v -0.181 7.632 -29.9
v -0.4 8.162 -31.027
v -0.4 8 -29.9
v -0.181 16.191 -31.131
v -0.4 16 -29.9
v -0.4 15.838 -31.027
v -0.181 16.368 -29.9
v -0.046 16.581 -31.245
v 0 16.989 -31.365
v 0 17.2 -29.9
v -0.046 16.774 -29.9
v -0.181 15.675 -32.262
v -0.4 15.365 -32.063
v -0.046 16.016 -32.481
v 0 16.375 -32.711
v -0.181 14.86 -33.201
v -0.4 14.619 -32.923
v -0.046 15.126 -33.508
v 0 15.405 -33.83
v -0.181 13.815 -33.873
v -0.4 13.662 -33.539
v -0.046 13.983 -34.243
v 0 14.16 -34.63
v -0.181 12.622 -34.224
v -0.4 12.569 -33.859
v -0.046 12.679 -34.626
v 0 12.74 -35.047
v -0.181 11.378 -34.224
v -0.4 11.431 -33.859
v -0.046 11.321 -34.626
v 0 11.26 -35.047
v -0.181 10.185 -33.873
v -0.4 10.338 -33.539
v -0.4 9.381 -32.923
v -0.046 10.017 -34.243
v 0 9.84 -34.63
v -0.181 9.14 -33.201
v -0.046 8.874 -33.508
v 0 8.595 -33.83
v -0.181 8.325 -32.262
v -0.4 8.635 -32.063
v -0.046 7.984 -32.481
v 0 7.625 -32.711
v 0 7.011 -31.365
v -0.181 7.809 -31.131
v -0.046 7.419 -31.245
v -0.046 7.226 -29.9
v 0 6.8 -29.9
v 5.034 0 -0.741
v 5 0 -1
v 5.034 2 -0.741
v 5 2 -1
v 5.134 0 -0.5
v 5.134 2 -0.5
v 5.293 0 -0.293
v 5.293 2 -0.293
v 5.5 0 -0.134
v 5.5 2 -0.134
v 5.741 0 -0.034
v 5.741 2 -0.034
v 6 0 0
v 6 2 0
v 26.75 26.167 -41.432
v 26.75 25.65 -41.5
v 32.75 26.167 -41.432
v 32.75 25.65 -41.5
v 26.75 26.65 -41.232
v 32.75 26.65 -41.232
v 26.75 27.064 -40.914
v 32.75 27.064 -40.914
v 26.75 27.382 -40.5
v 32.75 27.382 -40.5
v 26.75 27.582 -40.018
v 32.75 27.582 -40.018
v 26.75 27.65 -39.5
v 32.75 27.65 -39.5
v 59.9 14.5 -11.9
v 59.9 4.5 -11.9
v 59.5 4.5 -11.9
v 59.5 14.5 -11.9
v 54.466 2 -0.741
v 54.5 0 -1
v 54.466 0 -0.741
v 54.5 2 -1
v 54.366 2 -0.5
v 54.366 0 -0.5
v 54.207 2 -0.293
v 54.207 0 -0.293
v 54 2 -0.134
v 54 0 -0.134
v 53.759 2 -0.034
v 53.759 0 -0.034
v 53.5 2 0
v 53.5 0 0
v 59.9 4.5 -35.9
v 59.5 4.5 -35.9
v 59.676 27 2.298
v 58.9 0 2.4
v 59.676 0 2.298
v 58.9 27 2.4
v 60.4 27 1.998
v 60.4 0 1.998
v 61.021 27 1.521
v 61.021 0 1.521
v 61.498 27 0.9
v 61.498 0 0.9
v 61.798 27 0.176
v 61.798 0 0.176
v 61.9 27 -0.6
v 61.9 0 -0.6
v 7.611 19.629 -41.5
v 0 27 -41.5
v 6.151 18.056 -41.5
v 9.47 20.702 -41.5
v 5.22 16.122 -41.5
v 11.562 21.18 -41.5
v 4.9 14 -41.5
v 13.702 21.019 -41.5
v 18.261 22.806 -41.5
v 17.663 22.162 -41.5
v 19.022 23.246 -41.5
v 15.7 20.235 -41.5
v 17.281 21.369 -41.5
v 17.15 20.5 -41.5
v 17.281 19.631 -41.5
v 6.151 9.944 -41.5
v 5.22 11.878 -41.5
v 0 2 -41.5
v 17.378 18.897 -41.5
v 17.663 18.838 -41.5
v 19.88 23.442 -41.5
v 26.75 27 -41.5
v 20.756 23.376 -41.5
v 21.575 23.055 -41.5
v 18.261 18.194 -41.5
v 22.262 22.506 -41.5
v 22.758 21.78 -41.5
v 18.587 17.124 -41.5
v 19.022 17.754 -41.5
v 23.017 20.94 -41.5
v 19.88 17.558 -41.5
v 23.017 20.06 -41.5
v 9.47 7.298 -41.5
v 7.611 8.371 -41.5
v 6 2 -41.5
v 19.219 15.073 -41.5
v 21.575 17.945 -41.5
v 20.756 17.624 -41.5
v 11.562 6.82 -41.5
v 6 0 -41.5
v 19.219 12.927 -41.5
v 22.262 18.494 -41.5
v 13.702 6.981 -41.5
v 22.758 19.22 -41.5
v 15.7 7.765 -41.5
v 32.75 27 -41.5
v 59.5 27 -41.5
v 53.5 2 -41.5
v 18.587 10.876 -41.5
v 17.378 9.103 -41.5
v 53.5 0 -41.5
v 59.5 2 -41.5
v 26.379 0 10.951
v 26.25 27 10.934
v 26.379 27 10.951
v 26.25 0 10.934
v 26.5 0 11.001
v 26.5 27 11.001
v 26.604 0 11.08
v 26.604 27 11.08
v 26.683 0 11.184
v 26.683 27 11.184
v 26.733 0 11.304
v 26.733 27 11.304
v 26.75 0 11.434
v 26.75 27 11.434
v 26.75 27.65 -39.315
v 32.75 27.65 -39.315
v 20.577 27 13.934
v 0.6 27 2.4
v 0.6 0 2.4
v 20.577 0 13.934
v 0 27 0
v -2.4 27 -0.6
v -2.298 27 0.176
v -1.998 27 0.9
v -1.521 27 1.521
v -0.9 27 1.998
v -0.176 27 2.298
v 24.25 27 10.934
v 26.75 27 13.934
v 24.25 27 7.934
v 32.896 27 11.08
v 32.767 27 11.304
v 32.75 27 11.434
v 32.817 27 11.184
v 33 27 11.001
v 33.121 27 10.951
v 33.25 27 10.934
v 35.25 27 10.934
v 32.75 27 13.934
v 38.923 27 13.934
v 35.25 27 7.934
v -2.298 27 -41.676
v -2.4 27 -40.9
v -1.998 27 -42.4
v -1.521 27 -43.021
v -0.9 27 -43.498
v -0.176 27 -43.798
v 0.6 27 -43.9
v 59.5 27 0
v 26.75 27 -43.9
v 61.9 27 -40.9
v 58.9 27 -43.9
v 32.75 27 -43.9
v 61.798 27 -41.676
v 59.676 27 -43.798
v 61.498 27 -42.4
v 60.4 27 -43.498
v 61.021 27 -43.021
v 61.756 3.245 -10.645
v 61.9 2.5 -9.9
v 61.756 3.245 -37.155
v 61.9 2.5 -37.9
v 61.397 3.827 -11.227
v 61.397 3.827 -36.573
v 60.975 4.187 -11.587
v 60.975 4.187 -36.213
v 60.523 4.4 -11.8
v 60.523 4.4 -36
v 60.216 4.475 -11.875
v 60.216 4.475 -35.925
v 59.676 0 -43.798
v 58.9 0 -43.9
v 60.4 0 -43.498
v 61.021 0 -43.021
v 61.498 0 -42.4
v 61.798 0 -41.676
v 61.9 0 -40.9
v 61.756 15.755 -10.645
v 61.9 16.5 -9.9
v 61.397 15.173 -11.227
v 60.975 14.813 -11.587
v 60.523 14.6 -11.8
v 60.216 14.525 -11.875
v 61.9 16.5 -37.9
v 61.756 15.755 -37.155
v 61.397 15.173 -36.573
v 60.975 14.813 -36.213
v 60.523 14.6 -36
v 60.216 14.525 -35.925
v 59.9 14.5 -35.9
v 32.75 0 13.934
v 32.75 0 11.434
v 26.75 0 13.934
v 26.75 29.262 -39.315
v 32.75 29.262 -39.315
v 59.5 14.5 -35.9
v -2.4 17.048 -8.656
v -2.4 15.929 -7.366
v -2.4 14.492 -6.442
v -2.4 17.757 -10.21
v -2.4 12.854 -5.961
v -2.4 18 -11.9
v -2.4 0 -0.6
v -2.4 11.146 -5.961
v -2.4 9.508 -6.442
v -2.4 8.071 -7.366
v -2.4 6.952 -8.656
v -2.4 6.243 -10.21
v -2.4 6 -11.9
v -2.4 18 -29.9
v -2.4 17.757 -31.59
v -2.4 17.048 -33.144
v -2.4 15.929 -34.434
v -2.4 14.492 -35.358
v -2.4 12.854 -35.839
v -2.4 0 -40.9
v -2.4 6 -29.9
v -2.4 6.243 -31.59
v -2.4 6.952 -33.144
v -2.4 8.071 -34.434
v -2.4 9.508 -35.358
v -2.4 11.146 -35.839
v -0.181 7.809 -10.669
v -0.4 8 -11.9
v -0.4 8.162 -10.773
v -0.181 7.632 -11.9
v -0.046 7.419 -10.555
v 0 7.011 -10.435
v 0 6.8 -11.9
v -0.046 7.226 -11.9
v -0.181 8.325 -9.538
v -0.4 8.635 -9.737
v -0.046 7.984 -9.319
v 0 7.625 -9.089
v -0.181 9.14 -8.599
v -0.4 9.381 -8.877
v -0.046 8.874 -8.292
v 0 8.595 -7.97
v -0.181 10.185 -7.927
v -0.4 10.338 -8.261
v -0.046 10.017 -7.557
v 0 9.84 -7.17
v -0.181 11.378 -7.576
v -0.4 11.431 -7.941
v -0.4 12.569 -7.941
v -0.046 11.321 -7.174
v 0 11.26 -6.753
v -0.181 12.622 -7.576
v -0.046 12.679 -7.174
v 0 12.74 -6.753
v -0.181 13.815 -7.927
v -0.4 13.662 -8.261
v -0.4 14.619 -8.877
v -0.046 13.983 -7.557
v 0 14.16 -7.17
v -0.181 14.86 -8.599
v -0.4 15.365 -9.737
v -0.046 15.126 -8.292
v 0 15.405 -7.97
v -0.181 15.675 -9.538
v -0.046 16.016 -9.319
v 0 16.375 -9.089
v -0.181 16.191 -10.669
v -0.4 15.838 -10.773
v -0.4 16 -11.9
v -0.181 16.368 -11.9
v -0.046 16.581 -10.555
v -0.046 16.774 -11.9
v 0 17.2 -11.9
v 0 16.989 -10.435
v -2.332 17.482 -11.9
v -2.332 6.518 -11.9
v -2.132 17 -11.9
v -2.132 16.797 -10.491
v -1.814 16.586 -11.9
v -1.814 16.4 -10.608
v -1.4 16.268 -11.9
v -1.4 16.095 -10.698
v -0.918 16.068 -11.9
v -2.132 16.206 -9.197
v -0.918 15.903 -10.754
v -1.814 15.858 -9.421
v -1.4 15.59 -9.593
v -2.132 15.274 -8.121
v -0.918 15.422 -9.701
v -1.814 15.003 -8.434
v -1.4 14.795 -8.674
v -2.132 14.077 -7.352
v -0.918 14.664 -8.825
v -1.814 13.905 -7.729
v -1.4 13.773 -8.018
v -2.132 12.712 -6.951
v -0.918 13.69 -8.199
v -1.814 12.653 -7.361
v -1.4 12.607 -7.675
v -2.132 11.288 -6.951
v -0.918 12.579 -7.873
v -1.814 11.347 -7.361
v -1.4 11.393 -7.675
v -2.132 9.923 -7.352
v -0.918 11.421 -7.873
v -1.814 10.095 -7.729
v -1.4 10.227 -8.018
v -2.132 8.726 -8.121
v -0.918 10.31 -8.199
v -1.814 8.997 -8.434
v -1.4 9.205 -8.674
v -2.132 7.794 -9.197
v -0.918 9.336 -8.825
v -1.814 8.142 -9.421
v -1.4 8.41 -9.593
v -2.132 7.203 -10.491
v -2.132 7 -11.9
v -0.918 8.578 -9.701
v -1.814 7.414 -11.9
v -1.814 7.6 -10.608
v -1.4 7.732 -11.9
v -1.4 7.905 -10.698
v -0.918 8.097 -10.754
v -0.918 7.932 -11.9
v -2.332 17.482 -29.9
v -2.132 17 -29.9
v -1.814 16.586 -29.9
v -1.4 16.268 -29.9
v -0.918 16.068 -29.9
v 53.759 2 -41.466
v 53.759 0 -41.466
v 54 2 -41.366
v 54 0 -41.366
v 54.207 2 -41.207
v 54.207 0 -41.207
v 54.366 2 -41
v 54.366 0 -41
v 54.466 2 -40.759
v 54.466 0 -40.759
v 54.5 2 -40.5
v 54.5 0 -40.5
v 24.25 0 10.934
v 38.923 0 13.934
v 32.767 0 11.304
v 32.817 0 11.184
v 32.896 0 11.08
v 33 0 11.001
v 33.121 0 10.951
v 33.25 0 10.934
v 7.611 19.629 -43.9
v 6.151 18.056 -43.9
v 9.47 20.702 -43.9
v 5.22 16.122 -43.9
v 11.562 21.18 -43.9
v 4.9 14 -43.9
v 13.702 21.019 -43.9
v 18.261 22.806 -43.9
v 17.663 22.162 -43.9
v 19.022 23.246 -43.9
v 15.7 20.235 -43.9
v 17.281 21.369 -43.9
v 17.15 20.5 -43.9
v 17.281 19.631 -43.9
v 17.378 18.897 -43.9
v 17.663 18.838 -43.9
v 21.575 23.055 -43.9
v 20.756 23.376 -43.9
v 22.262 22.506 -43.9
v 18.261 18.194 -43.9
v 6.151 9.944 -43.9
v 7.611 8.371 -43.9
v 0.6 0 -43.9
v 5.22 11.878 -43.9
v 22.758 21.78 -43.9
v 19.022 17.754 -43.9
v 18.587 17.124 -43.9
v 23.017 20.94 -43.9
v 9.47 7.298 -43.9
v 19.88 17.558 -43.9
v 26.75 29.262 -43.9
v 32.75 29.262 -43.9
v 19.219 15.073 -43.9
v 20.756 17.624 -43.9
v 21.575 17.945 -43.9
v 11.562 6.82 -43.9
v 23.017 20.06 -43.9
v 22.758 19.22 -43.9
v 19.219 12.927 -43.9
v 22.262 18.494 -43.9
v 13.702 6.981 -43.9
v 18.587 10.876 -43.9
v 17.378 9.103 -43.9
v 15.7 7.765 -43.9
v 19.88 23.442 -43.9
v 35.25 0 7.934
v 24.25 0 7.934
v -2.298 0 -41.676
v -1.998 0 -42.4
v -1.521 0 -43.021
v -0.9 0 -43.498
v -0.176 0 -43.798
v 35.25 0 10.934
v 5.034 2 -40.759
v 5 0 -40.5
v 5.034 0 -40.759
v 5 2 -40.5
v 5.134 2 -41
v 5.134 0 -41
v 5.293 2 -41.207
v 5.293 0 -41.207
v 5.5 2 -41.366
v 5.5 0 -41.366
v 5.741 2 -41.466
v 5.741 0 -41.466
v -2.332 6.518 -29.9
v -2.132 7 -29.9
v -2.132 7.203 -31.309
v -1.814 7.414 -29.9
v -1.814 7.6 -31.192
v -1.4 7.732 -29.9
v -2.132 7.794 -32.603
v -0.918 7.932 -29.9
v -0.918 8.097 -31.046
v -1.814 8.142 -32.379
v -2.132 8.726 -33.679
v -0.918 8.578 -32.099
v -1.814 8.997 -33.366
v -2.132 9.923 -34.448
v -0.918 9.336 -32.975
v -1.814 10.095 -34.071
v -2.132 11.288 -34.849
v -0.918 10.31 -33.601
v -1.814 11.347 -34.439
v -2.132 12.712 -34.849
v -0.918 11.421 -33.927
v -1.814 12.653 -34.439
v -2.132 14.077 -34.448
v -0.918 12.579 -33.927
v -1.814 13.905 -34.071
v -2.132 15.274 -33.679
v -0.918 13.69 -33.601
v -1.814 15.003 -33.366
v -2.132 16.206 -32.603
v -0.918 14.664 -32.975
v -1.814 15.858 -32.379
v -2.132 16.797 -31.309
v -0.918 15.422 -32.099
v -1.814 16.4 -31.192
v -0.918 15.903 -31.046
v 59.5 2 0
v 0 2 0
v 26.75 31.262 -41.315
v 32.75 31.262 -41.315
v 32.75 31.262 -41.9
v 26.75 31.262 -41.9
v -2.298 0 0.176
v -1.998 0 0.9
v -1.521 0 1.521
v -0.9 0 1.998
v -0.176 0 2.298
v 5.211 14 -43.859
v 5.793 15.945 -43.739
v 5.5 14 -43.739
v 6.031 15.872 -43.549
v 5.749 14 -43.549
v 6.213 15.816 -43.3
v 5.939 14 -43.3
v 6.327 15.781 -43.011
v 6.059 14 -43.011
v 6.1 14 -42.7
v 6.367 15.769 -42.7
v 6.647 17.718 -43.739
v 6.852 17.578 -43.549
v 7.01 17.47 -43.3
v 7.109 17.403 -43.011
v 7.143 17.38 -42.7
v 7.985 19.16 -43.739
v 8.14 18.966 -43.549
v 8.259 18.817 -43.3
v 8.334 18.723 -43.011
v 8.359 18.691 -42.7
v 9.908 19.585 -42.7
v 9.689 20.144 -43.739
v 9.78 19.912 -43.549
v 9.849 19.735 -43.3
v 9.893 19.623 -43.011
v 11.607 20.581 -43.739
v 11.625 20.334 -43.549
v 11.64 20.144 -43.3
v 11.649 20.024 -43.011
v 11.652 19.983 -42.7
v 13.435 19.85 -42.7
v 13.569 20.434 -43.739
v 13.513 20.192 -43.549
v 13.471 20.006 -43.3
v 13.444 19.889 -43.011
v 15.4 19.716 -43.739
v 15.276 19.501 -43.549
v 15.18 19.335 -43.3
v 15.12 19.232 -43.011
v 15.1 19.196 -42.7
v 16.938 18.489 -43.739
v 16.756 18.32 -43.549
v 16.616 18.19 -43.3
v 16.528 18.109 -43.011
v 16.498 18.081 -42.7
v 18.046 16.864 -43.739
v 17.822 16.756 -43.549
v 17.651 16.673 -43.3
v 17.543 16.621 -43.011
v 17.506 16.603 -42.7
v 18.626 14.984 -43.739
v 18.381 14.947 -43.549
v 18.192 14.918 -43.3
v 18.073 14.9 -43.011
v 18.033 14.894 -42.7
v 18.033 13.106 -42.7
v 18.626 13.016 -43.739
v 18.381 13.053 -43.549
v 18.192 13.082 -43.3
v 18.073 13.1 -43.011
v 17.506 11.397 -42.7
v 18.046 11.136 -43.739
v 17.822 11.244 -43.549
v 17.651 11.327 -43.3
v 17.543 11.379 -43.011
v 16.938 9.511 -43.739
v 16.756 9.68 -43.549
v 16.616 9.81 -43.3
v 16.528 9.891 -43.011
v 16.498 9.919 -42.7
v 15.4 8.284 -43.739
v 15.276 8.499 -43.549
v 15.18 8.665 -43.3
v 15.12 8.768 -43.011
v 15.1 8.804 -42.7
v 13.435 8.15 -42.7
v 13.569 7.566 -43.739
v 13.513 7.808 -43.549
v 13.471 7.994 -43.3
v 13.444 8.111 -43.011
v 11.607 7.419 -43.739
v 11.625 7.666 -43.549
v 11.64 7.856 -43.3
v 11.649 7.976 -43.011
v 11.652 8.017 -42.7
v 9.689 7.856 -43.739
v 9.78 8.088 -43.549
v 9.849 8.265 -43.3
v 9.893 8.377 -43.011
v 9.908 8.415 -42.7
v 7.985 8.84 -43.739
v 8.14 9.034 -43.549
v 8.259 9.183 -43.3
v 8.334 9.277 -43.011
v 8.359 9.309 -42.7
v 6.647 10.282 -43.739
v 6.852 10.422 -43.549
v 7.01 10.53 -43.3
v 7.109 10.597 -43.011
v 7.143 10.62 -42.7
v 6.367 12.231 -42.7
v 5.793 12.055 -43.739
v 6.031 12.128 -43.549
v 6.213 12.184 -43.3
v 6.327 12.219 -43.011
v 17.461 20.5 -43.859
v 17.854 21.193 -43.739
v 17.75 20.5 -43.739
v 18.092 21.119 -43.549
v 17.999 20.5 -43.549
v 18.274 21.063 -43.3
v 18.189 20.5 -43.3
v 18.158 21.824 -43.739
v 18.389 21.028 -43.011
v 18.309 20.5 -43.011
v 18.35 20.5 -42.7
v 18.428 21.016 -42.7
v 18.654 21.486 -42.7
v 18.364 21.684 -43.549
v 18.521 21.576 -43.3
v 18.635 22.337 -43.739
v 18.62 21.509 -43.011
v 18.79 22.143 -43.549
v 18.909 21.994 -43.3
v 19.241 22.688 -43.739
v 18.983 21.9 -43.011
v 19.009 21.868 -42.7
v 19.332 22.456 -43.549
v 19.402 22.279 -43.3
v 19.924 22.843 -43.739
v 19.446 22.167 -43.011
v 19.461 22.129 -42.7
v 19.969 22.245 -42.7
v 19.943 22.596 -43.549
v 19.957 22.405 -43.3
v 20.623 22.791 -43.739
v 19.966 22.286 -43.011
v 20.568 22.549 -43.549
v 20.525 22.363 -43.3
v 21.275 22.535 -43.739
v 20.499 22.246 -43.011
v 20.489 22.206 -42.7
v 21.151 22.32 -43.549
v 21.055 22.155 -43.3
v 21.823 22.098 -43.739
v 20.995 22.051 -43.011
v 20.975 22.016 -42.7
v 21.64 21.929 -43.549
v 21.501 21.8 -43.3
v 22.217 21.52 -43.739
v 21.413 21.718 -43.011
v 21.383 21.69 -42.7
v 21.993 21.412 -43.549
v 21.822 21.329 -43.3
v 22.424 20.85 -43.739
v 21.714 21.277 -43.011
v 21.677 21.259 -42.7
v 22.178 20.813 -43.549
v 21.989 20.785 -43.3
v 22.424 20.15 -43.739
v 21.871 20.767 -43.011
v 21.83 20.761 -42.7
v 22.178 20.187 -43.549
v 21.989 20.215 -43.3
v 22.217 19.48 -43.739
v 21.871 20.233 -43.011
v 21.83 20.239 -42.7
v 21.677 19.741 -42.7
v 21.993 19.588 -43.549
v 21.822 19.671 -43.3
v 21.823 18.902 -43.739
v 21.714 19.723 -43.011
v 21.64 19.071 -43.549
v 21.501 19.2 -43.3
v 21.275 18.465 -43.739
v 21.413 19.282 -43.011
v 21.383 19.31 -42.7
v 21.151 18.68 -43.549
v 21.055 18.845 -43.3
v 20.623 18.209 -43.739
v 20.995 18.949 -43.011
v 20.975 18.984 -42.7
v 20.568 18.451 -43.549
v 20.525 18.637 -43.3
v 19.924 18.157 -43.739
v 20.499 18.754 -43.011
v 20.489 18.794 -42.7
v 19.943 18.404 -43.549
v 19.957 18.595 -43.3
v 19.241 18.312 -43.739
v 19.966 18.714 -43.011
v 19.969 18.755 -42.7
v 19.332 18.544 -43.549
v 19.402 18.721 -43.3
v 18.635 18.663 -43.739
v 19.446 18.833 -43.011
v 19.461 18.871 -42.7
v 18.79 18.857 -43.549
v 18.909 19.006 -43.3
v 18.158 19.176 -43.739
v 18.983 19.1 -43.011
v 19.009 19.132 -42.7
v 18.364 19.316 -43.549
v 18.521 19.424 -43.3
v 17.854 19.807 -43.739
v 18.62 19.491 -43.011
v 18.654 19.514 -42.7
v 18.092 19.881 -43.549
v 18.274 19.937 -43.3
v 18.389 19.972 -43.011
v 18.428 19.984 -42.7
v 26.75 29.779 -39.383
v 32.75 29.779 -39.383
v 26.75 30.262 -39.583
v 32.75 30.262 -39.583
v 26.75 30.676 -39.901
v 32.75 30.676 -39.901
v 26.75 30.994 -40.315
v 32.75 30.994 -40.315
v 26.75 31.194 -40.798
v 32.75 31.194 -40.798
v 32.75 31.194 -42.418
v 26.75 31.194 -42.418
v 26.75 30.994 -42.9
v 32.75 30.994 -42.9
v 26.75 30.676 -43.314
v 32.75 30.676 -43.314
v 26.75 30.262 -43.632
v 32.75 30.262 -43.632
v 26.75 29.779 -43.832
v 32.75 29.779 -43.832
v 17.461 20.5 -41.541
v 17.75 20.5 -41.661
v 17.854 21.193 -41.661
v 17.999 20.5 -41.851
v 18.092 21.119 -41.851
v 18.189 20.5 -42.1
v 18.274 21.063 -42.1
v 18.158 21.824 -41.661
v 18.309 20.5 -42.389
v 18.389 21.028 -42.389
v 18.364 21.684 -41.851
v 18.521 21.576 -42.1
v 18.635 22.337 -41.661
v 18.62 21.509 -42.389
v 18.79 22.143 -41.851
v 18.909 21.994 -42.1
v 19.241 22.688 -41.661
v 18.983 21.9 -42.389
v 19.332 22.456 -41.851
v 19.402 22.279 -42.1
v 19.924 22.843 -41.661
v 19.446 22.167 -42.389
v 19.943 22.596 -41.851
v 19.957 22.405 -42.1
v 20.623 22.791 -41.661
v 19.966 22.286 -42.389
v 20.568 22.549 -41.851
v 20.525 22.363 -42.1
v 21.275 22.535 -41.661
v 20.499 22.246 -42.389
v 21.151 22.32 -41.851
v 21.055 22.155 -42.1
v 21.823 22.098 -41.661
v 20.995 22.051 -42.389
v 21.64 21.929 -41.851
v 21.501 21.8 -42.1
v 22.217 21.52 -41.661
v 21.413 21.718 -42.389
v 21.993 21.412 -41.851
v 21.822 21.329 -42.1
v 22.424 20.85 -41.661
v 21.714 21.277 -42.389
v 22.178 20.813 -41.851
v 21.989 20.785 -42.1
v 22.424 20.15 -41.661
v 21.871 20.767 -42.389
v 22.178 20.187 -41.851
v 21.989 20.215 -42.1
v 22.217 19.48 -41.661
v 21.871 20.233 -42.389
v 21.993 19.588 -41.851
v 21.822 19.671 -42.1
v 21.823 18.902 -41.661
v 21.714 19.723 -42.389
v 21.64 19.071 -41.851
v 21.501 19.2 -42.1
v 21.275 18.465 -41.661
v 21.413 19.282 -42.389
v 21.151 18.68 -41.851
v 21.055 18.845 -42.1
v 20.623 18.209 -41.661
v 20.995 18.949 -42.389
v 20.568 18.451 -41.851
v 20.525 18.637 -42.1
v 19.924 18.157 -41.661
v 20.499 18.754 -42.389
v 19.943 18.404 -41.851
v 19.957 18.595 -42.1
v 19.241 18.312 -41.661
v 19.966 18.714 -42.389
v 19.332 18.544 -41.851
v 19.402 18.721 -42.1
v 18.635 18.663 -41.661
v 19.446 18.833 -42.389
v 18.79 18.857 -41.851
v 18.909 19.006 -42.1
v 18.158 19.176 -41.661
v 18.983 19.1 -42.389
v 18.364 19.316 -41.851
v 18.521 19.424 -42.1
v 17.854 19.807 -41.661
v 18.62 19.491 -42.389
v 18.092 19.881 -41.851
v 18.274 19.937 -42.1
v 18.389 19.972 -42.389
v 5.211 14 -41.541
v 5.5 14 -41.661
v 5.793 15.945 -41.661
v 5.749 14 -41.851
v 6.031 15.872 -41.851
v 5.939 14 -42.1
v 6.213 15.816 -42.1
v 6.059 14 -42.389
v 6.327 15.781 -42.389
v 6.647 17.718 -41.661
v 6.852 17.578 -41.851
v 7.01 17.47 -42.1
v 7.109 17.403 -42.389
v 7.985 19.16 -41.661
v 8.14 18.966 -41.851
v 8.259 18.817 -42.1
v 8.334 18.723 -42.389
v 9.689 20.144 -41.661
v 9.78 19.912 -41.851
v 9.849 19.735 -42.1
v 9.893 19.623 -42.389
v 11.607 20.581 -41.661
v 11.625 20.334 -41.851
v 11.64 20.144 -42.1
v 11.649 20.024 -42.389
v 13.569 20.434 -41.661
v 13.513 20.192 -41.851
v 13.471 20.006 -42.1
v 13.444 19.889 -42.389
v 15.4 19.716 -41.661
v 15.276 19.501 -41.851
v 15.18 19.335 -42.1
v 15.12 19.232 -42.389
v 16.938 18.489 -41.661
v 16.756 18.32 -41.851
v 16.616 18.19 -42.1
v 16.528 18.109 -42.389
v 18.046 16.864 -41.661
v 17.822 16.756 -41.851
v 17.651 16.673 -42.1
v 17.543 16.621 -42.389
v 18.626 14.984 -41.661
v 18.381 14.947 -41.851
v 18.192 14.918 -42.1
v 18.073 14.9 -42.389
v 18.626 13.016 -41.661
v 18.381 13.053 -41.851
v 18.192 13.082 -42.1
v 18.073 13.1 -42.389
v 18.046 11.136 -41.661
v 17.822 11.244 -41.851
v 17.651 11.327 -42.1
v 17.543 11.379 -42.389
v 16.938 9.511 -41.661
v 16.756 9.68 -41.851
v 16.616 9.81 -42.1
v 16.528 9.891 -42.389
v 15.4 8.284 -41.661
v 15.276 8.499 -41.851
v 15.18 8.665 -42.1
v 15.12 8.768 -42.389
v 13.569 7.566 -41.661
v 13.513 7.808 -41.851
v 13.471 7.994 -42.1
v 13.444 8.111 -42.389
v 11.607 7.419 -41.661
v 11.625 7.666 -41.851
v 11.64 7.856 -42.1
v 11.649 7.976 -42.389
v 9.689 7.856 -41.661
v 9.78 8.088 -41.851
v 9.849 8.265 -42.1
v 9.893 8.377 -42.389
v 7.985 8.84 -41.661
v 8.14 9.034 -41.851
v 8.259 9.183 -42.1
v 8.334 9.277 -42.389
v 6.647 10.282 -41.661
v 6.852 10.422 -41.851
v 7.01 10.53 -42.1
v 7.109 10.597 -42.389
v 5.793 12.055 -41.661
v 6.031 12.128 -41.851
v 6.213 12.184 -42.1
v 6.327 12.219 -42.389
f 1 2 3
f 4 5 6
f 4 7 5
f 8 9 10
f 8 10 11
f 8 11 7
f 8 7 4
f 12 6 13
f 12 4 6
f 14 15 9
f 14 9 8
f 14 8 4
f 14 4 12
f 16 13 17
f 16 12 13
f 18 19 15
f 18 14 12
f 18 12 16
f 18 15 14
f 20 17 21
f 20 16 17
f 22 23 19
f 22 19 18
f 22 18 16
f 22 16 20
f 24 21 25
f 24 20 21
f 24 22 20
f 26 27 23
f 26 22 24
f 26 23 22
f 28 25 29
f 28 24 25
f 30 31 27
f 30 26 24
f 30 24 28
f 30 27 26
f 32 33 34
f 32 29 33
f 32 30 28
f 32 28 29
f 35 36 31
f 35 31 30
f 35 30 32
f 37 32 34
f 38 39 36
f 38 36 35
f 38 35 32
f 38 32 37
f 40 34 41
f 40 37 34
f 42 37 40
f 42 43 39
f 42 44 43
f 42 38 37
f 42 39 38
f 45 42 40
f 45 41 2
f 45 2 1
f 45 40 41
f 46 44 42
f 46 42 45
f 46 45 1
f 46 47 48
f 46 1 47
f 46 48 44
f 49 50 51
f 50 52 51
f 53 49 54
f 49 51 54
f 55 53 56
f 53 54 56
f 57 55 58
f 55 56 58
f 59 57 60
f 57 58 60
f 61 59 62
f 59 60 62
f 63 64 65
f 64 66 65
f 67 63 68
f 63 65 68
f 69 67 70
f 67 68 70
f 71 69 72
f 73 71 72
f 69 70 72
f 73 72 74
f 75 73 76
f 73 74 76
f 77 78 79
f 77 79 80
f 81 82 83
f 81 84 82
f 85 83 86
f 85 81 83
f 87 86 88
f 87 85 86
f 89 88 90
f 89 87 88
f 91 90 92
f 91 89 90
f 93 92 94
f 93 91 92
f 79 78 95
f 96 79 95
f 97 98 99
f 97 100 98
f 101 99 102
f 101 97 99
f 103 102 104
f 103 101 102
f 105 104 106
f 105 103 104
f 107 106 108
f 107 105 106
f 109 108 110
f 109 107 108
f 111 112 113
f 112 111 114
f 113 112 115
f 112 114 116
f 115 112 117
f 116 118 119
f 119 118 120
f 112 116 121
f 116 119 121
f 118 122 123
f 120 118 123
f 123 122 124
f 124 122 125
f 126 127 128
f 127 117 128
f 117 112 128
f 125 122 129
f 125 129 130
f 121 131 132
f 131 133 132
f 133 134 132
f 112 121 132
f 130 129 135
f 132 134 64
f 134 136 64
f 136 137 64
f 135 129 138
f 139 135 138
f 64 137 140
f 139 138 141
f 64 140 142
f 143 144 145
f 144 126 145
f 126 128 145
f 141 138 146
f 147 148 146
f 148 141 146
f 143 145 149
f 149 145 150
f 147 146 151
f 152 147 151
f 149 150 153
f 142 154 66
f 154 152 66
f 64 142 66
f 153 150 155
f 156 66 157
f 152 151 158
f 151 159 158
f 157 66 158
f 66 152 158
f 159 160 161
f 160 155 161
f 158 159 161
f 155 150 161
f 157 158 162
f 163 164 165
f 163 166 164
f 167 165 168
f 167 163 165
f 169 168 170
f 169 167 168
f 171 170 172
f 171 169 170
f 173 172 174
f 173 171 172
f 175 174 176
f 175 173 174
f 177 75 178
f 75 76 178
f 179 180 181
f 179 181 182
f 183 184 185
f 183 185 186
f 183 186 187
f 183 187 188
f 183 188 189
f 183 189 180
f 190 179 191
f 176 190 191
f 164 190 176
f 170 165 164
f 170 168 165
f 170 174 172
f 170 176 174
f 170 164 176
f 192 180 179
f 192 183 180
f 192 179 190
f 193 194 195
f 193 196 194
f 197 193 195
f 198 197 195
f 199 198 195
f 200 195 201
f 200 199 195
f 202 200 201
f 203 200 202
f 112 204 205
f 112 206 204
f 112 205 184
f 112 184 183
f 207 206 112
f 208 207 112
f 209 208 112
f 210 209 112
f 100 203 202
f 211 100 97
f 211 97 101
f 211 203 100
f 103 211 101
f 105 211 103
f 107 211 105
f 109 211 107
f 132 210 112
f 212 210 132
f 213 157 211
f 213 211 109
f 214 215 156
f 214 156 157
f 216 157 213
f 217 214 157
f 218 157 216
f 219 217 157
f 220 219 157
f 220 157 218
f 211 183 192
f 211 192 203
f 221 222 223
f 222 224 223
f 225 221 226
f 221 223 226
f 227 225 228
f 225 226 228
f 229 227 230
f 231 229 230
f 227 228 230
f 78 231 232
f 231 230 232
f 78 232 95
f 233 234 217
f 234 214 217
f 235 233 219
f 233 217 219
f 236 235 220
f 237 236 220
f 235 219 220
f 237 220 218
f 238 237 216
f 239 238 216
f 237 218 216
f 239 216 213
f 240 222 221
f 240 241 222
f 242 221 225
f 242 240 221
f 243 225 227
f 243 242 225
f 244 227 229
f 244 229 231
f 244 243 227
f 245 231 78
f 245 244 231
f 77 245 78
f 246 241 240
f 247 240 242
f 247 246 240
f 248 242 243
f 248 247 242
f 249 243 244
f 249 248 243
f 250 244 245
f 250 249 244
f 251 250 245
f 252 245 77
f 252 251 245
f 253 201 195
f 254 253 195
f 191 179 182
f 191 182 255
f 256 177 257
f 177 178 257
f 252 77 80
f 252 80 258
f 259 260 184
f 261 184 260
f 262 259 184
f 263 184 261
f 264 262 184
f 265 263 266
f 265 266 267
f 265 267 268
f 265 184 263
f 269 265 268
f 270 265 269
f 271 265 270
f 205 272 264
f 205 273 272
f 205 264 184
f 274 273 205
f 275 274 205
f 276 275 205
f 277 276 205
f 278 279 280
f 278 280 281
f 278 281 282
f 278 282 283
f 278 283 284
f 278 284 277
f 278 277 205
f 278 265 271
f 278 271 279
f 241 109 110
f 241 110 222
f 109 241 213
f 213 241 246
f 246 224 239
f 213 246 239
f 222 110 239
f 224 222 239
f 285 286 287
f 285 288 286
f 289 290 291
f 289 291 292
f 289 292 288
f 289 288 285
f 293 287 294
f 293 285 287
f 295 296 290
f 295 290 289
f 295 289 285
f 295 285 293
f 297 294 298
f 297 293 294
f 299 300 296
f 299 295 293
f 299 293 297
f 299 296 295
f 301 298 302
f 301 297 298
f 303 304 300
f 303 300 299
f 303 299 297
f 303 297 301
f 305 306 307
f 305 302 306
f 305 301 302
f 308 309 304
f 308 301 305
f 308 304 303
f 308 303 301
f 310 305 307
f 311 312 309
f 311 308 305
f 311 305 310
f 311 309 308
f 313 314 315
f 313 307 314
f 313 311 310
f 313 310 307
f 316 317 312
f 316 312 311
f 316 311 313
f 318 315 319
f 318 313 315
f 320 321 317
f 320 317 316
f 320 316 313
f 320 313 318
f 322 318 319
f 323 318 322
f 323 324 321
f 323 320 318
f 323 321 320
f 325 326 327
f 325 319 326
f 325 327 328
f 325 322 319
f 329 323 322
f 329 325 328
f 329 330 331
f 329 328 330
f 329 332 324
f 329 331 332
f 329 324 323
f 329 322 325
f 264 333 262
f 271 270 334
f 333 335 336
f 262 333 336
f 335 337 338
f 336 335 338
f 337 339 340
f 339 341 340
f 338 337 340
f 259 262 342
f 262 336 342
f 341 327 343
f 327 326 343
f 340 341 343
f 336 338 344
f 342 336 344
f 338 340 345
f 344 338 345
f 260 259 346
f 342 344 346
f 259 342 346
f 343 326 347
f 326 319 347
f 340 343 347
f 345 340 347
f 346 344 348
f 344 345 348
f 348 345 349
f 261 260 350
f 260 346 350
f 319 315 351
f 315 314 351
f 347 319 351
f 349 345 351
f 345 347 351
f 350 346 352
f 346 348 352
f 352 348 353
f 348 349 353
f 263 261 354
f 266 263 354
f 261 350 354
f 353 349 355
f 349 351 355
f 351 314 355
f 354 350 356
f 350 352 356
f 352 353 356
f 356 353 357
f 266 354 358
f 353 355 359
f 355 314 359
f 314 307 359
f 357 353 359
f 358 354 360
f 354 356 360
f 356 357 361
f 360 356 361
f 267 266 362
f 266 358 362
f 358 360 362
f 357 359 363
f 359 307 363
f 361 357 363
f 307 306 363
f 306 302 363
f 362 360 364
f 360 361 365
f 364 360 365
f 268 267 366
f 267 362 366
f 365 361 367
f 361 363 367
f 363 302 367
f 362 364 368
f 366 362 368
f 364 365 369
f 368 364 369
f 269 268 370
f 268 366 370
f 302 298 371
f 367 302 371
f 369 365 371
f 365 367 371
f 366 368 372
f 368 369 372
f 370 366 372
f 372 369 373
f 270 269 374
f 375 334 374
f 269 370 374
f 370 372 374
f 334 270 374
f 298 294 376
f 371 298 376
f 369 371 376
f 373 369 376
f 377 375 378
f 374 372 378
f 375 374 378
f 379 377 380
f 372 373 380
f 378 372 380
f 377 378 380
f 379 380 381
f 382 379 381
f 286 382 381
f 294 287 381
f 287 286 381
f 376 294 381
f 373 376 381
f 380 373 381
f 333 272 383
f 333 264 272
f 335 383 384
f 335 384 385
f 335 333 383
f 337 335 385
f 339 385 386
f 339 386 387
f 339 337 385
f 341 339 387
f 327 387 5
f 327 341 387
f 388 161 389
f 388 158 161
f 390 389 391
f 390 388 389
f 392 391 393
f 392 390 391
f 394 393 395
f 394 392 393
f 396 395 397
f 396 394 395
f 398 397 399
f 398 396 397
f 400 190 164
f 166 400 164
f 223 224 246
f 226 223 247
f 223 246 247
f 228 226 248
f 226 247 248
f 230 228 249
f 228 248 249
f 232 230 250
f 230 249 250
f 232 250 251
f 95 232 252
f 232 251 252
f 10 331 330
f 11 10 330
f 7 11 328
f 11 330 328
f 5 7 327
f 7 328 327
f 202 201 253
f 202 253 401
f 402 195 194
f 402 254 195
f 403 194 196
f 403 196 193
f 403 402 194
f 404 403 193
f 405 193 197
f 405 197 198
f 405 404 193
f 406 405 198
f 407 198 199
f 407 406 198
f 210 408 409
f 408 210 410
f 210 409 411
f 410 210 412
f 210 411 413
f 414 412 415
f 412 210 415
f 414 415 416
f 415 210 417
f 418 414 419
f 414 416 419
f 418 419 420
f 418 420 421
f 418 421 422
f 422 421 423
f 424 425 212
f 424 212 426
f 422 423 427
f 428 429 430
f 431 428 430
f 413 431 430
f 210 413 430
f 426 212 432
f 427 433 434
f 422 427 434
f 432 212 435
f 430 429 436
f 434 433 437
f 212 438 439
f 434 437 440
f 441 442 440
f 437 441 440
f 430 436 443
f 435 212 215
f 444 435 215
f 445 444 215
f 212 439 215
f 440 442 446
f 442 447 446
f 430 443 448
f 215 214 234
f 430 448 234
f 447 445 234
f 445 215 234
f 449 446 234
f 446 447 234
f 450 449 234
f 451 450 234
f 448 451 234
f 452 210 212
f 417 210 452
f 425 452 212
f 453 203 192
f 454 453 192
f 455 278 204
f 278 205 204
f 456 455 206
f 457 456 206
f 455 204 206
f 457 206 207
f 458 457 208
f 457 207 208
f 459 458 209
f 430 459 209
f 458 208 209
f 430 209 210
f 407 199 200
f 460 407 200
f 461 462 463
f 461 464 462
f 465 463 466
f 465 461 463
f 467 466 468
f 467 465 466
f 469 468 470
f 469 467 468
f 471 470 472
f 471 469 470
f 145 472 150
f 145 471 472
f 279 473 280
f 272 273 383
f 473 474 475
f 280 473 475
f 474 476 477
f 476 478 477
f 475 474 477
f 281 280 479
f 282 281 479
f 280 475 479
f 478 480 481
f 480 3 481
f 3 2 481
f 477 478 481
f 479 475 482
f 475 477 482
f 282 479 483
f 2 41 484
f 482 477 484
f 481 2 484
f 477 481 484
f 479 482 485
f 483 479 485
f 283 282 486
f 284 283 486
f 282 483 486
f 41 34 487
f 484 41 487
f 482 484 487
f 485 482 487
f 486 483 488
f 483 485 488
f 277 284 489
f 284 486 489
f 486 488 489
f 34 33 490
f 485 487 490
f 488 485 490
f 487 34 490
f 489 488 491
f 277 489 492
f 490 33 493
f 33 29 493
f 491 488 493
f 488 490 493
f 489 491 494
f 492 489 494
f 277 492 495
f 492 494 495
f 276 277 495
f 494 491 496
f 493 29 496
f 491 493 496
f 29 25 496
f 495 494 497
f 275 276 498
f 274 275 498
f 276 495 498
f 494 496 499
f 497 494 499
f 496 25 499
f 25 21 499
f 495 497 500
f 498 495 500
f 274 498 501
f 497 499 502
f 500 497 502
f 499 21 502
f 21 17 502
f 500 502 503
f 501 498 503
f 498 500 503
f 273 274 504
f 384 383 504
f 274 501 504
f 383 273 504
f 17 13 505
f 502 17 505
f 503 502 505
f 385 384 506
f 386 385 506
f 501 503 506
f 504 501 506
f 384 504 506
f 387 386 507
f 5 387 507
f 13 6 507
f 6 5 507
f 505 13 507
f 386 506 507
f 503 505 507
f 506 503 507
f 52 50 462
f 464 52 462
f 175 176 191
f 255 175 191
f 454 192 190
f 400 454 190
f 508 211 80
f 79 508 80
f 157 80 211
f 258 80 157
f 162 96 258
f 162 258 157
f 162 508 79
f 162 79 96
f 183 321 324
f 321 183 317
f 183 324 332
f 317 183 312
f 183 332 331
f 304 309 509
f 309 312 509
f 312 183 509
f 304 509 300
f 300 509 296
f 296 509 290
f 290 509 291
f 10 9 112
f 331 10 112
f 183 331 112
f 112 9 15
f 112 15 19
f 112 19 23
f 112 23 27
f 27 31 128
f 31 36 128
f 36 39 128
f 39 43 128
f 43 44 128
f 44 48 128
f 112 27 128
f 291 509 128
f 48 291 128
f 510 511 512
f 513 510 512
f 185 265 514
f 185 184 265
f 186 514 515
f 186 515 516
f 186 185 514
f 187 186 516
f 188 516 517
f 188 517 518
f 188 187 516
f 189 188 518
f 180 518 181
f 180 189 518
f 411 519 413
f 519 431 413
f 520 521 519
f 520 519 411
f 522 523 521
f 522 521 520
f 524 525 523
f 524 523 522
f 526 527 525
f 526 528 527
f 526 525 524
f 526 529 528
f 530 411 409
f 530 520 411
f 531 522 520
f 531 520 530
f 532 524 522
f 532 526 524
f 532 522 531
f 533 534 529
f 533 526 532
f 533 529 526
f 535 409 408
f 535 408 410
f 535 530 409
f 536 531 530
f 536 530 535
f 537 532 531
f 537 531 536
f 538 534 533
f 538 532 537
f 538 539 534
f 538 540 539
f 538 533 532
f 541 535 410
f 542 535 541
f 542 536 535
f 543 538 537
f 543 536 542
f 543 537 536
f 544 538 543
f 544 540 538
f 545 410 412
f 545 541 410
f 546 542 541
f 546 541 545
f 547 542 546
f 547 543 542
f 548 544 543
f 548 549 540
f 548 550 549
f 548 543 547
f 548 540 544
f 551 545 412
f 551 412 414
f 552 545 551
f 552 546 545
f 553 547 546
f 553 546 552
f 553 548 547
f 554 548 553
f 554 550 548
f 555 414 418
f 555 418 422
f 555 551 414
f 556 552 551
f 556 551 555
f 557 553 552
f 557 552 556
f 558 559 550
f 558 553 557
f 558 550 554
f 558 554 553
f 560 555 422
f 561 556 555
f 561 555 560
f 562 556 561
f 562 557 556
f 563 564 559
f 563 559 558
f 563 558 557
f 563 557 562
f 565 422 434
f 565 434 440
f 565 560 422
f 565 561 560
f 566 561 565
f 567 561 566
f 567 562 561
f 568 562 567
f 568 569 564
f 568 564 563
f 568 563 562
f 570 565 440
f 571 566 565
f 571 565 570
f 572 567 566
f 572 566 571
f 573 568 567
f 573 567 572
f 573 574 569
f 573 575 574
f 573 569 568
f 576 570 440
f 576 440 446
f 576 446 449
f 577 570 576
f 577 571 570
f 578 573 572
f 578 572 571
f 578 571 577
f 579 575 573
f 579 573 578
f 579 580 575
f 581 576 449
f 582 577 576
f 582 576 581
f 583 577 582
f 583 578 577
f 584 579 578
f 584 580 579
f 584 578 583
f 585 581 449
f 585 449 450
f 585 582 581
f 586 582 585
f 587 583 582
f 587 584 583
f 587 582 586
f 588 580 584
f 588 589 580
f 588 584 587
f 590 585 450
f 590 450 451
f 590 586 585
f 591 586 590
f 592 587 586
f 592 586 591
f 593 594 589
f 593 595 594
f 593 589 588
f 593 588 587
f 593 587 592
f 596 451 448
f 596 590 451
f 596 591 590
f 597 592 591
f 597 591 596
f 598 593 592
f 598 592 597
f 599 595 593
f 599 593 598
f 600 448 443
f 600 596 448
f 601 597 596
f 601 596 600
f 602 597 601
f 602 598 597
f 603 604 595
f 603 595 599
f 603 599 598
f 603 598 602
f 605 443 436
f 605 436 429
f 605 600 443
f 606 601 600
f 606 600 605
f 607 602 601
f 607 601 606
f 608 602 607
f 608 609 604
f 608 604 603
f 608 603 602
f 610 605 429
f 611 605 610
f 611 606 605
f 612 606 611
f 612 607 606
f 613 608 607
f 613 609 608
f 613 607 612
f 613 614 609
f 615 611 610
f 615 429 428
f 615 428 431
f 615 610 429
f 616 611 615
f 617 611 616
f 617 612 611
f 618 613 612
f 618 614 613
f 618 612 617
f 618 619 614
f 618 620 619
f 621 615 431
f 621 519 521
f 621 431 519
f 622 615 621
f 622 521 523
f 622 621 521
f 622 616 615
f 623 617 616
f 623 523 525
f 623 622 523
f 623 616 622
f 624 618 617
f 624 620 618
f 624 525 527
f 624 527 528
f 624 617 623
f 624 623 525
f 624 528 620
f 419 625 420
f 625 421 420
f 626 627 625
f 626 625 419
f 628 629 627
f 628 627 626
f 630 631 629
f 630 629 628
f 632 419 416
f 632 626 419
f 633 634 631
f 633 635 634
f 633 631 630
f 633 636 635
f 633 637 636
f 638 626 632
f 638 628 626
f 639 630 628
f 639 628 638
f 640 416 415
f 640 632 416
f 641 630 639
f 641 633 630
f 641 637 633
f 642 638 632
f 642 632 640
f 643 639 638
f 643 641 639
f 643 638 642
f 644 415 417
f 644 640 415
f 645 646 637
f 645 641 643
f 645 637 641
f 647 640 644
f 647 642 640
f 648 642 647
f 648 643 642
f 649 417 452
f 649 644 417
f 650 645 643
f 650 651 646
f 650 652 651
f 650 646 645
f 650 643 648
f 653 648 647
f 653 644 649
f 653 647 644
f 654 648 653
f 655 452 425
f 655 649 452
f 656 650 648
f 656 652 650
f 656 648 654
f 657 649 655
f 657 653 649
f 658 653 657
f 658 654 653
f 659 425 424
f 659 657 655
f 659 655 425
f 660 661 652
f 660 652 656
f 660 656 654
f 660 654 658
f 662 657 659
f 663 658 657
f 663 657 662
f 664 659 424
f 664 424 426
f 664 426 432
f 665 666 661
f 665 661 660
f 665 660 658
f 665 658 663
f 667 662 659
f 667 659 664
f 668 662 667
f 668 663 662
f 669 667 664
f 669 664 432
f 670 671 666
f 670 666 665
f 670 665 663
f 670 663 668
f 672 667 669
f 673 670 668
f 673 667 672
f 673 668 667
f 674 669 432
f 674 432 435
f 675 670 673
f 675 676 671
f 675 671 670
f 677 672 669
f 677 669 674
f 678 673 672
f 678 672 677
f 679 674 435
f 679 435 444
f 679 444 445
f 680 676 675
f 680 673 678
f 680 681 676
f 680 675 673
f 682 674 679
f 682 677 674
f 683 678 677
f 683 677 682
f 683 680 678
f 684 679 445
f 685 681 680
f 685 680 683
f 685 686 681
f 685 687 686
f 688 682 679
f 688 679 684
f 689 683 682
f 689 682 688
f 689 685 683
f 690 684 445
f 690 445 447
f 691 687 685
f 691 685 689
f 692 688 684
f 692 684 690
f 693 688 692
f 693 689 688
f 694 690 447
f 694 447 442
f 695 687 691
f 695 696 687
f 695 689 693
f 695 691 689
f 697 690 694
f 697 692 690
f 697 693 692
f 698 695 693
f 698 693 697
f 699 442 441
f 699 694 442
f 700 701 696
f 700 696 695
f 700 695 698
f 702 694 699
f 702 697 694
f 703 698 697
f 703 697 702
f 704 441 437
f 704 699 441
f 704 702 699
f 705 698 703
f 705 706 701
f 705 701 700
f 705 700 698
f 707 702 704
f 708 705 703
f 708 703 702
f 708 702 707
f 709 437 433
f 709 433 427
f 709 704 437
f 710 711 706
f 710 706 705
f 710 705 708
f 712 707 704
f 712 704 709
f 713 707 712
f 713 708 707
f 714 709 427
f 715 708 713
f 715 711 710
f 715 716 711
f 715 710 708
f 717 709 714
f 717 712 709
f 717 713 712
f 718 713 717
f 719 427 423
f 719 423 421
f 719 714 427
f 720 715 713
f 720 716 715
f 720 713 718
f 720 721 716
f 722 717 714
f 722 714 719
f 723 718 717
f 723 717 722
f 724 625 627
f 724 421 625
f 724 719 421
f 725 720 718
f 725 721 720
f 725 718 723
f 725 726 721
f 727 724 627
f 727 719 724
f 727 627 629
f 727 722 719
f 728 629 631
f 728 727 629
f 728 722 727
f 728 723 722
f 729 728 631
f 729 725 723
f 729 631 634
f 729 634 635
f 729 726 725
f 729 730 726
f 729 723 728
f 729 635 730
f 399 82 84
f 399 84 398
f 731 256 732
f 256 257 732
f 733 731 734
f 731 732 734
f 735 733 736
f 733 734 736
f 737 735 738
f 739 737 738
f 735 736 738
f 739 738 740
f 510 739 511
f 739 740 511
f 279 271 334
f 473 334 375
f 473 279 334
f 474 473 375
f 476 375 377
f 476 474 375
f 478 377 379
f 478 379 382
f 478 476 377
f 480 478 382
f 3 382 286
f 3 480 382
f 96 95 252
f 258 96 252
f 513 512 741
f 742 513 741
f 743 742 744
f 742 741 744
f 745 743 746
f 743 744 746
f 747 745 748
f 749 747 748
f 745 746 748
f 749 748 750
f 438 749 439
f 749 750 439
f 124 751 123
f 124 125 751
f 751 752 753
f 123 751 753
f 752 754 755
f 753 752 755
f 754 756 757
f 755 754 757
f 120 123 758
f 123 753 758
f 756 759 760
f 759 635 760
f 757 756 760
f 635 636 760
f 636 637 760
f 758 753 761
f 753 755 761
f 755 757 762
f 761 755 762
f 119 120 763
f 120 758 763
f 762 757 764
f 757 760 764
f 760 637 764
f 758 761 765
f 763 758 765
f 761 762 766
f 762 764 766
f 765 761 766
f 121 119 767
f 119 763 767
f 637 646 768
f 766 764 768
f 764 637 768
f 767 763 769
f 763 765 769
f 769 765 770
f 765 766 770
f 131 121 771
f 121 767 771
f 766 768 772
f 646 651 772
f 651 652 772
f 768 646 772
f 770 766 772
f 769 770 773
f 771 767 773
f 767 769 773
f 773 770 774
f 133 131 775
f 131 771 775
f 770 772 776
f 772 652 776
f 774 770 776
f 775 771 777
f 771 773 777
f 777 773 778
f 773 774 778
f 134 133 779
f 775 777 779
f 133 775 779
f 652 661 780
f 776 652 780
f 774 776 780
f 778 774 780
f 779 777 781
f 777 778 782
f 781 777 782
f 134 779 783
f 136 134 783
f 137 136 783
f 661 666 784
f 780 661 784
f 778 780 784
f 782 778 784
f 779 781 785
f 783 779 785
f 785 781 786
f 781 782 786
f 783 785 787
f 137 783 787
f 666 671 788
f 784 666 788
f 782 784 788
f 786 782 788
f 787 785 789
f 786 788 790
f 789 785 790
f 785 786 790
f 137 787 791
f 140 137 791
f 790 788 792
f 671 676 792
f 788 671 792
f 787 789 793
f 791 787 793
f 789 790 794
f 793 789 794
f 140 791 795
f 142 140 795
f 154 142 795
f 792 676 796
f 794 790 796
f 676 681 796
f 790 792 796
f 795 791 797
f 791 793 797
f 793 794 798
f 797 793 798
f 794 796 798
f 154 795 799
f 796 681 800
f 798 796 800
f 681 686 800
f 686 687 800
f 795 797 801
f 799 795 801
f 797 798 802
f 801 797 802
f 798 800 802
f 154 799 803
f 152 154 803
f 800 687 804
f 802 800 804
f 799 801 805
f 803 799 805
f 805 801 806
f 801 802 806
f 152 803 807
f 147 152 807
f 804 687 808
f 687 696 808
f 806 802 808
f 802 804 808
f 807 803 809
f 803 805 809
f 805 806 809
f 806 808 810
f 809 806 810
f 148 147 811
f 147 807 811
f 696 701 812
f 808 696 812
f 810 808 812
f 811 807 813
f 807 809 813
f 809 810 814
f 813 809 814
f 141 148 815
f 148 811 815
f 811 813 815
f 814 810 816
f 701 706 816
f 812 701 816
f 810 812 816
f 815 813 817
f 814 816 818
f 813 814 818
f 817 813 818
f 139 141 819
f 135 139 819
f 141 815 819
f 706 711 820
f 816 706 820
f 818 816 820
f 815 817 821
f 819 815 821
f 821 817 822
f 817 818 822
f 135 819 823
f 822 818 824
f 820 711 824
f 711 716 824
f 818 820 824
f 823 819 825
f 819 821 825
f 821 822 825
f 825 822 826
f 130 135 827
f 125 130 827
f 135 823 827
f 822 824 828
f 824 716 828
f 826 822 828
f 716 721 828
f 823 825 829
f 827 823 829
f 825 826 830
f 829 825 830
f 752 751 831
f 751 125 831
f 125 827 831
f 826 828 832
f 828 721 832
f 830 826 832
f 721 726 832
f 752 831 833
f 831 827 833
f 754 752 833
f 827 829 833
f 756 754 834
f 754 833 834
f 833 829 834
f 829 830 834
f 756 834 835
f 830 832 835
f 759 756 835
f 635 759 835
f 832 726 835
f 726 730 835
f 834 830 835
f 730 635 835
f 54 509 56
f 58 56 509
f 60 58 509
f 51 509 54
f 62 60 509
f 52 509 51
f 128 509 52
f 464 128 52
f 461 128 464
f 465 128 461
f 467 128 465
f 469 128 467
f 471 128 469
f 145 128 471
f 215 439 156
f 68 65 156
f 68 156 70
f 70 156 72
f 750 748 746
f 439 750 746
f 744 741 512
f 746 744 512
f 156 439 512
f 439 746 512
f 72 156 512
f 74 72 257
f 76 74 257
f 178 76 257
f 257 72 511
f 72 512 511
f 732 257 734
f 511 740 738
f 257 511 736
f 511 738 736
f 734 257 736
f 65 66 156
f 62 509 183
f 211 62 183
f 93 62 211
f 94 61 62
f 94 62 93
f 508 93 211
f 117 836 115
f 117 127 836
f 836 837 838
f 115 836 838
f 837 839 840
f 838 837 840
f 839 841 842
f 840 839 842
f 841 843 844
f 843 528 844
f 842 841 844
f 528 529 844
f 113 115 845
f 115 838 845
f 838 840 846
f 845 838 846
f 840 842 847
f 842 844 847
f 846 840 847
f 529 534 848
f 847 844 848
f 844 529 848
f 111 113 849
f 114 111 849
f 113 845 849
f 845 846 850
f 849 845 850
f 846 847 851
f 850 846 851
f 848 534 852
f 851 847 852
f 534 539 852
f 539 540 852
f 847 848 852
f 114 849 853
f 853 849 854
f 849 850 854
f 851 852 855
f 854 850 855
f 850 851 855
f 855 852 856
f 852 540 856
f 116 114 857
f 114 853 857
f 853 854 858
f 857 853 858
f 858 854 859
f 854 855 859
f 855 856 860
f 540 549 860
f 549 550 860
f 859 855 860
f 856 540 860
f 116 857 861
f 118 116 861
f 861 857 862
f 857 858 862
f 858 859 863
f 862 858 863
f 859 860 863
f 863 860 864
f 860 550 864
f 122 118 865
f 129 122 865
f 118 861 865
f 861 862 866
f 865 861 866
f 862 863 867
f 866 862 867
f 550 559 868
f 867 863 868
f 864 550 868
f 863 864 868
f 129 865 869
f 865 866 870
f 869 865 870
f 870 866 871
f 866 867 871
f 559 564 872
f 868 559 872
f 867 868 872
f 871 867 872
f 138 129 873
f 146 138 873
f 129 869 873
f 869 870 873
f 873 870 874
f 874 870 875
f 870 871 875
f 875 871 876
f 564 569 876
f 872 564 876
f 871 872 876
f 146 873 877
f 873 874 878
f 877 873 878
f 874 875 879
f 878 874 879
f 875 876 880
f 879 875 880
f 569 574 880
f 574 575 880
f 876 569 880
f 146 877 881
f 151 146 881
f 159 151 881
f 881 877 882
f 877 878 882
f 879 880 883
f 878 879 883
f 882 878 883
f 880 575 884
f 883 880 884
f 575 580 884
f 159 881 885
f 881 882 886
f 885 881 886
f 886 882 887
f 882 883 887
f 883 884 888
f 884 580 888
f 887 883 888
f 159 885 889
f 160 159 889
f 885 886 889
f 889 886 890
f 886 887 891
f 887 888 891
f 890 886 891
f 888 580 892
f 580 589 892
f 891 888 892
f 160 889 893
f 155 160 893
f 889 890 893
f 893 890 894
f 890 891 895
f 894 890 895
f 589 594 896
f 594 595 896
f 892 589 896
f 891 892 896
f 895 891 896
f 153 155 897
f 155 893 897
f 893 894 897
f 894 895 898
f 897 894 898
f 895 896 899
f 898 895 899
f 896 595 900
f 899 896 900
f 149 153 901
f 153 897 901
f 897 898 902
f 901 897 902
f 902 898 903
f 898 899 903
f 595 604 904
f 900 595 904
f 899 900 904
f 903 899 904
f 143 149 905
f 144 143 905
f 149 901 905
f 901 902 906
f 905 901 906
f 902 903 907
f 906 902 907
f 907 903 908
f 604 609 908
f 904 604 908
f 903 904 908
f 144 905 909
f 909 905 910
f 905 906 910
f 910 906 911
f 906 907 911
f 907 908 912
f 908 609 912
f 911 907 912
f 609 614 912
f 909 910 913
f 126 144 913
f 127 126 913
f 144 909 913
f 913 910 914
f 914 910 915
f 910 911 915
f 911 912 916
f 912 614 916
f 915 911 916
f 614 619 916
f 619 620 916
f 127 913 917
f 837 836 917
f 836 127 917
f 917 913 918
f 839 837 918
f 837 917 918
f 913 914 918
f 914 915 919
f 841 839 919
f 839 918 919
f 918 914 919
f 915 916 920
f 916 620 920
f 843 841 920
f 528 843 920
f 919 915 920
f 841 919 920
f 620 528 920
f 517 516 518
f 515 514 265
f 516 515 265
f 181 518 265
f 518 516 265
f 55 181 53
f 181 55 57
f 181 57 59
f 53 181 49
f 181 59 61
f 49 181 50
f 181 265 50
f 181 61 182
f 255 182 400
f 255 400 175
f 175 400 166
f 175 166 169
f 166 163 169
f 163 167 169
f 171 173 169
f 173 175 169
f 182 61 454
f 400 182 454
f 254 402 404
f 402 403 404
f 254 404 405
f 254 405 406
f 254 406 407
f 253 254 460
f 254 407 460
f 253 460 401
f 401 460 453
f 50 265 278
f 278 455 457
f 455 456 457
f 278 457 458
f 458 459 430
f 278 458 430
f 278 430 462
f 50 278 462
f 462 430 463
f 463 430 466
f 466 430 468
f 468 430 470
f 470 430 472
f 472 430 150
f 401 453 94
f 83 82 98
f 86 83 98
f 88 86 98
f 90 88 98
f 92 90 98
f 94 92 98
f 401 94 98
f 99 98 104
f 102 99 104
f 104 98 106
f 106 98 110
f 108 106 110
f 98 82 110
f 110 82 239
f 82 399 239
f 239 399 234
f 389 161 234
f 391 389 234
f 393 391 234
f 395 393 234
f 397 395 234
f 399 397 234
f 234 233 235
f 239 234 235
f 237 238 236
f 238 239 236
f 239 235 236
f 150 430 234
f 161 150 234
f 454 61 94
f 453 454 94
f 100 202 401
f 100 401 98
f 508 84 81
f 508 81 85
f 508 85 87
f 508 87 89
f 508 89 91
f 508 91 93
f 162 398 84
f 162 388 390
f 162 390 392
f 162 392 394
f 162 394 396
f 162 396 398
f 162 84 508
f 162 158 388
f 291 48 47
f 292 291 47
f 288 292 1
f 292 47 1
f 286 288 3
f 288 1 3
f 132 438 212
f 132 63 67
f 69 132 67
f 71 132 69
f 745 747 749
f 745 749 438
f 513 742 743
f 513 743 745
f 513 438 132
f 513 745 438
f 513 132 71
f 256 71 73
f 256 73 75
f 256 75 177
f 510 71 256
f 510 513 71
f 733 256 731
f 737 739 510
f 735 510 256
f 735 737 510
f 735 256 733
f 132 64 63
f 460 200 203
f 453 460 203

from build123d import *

# Parameters (mm, degrees)
SKETCH_1_W          = 64.3
SKETCH_1_H          = 46.3
SKETCH_1_W_2        = 59.5
SKETCH_1_H_2        = 41.5
EXTRUDE_2_DEPTH     = 27
SKETCH_1_3_W        = 5
SKETCH_1_3_H        = 41.5
EXTRUDE_3_DEPTH     = 2
FILLET_1_R          = 3
FILLET_2_R          = 1
SKETCH_2_R          = 6
SKETCH_2_R_2        = 1.75
CUT_EXTRUDE_2_DEPTH = 8
SKETCH_4_W          = 24
SKETCH_4_H          = 10
CUT_EXTRUDE_4_DEPTH = 12
FILLET_5_R          = 2
CUT_EXTRUDE_5_DEPTH = 12
FILLET_6_R          = 2
FILLET_7_R          = 2
FILLET_16_R         = 1.2
EXTRUDE_9_DEPTH     = 3
EXTRUDE_11_DEPTH    = 27
CUT_EXTRUDE_6_DEPTH = 81.54700491
FILLET_17_R         = 0.5


# Some blends are built 0.0001 mm under size
with BuildPart() as part:
    # Эскиз1 → Бобышка-Вытянуть2 (new body)
    with BuildSketch(Plane(origin=(0, 0, 0), x_dir=(1, 0, 0), z_dir=(0, 1, 0))):
        with Locations((29.75, 20.75)):
            Rectangle(SKETCH_1_W, SKETCH_1_H)
        with Locations((29.75, 20.75)):
            Rectangle(SKETCH_1_W_2, SKETCH_1_H_2, mode=Mode.SUBTRACT)
    extrude(amount=EXTRUDE_2_DEPTH)

    # Эскиз1<3> → Бобышка-Вытянуть3 (add)
    with BuildSketch(Plane(origin=(0, 0, 0), x_dir=(1, 0, 0), z_dir=(0, 1, 0))):
        with Locations((2.5, 20.75)):
            Rectangle(SKETCH_1_3_W, SKETCH_1_3_H)
        with Locations((57, 20.75)):
            Rectangle(SKETCH_1_3_W, SKETCH_1_3_H)
    extrude(amount=EXTRUDE_3_DEPTH)

    # Скругление1
    fillet_1_edges = [part.edges().sort_by_distance(p)[0] for p in [
        (-2.4, 13.5, -43.9),
        (61.9, 13.5, -43.9),
        (61.9, 13.5, 2.4),
        (-2.4, 13.5, 2.4),
    ]]
    fillet(fillet_1_edges, radius=FILLET_1_R)

    # Скругление2
    fillet_2_edges = [part.edges().sort_by_distance(p)[0] for p in [
        (5, 1, 0),
        (5, 1, -41.5),
        (54.5, 1, -41.5),
        (54.5, 1, 0),
    ]]
    fillet(fillet_2_edges, radius=FILLET_2_R)

    # Эскиз2 → Вырез-Вытянуть2 (cut)
    with BuildSketch(Plane(origin=(0, 0, -43.9), x_dir=(-1, 0, 0), z_dir=(0, 0, -1))):
        with Locations((-12.1, 14)):
            Circle(SKETCH_2_R)
        with Locations((-20.1, 20.5)):
            Circle(SKETCH_2_R_2)
    extrude(amount=-CUT_EXTRUDE_2_DEPTH, mode=Mode.SUBTRACT)

    # Эскиз4 → Вырез-Вытянуть4 (cut)
    with BuildSketch(Plane(origin=(61.9, 0, 0), x_dir=(0, 0, -1), z_dir=(1, 0, 0))):
        with Locations((23.9, 9.5)):
            Rectangle(SKETCH_4_W, SKETCH_4_H)
    extrude(amount=-CUT_EXTRUDE_4_DEPTH, mode=Mode.SUBTRACT)

    # Скругление5
    fillet_5_edges = [part.edges().sort_by_distance(p)[0] for p in [
        (61.9, 14.5, -23.9),
        (61.9, 9.5, -35.9),
        (61.9, 9.5, -11.9),
        (61.9, 4.5, -23.9),
    ]]
    fillet(fillet_5_edges, radius=FILLET_5_R)

    # Эскиз10 → Вырез-Вытянуть5 (cut)
    with BuildSketch(Plane.ZY.offset(2.4)):
        with BuildLine():
            Line((-29.9, 16), (-11.9, 16))
            ThreePointArc((-11.9, 16), (-7.9, 12), (-11.9, 8))
            Line((-11.9, 8), (-29.9, 8))
            ThreePointArc((-29.9, 8), (-33.9, 12), (-29.9, 16))
        make_face()
    extrude(amount=-CUT_EXTRUDE_5_DEPTH, mode=Mode.SUBTRACT)

    # Скругление6
    fillet_6_edges = [part.edges().sort_by_distance(p)[0] for p in [
        (-2.4, 16, -20.9),
        (-2.4, 12, -33.9),
        (-2.4, 8, -20.9),
        (-2.4, 12, -7.9),
    ]]
    fillet(fillet_6_edges, radius=FILLET_6_R)

    # Скругление7
    # the kernel refuses this fillet: 2 mm, written as the material it takes off along each edge
    with BuildSketch(Plane(origin=(0, 8, -29.9), x_dir=(-1, 0, 0), z_dir=(0, 0, 1)), Plane(origin=(0, 16, -11.9), x_dir=(-1, 0, 0), z_dir=(0, 0, -1))) as fillet_7_piece_1:
        with BuildLine():
            CenterArc((2, 1.2), FILLET_7_R, 180, 36.869897646)
            Line((0, 1.2), (-0.04, 1.2))
            Line((-0.04, 1.2), (-0.04, 0))
            Line((-0.04, 0), (0, -0.04))
            ThreePointArc((0, -0.04), (0.2, -0.04), (0.368, -0.024))
            Line((0.368, -0.024), (0.4, 0))
        make_face()
    extrude(amount=18, mode=Mode.SUBTRACT)
    with BuildSketch(Plane(origin=(0, 12, -29.9), x_dir=(0, 1, 0), z_dir=(0, 0, 1))) as fillet_7_piece_2:
        with BuildLine():
            CenterArc((5.2, 2), FILLET_7_R, 233.130102354, 36.869897646)
            Line((5.2, 0), (5.2, -0.04))
            Line((5.2, -0.04), (4, -0.04))
            Line((4, -0.04), (3.96, 0))
            ThreePointArc((3.96, 0), (3.96, 0.2), (3.976, 0.368))
            Line((3.976, 0.368), (4, 0.4))
        make_face()
    revolve(axis=Axis((0, 12, -29.9), (-1, 0, 0)), revolution_arc=180, mode=Mode.SUBTRACT)
    with BuildSketch(Plane(origin=(0, 12, -11.9), x_dir=(0, -1, 0), z_dir=(0, 0, -1))) as fillet_7_piece_3:
        with BuildLine():
            CenterArc((5.2, 2), FILLET_7_R, 233.130102354, 36.869897646)
            Line((5.2, 0), (5.2, -0.04))
            Line((5.2, -0.04), (4, -0.04))
            Line((4, -0.04), (3.96, 0))
            ThreePointArc((3.96, 0), (3.96, 0.2), (3.976, 0.368))
            Line((3.976, 0.368), (4, 0.4))
        make_face()
    revolve(axis=Axis((0, 12, -11.9), (-1, 0, 0)), revolution_arc=180, mode=Mode.SUBTRACT)

    # Скругление16
    fillet_16_edges = [part.edges().sort_by_distance(p)[0] for p in [
        (18.1, 14, -41.5),
        (18.1, 14, -43.9),
        (21.85, 20.5, -41.5),
        (21.85, 20.5, -43.9),
    ]]
    fillet(fillet_16_edges, radius=FILLET_16_R - 0.0001)  # a hair under: the kernel refuses the full size

    # Эскиз16 → Бобышка-Вытянуть9 (add, symmetric)
    with BuildSketch(Plane(origin=(29.75, 0, 0), x_dir=(0, 0, -1), z_dir=(1, 0, 0))):
        with BuildLine():
            Line((43.9, 29.261820769), (43.9, 24.626856239))
            Line((43.9, 24.626856239), (41.5, 24.626856239))
            Line((41.5, 24.626856239), (41.5, 25.649781137))
            ThreePointArc((41.5, 25.649781137), (40.914213562, 27.063994699), (39.5, 27.649781137))
            Line((39.5, 27.649781137), (39.315307367, 27.649781137))
            Line((39.315307367, 27.649781137), (39.315307367, 29.261820769))
            ThreePointArc((39.315307367, 29.261820769), (39.901093805, 30.676034332), (41.315307367, 31.261820769))
            Line((41.315307367, 31.261820769), (41.9, 31.261820769))
            ThreePointArc((41.9, 31.261820769), (43.314213562, 30.676034332), (43.9, 29.261820769))
        make_face()
    extrude(amount=EXTRUDE_9_DEPTH, both=True)

    # Эскиз17 → Бобышка-Вытянуть11 (add)
    with BuildSketch(Plane(origin=(0, 27, 0), x_dir=(1, 0, 0), z_dir=(0, 1, 0))):
        Polygon((54.9, -2.4), (29.75, -2.4), (29.75, -11.933833698), (38.386915645, -11.933833698), align=None)
        Polygon((29.75, -2.4), (4.6, -2.4), (21.113084355, -11.933833698), (29.75, -11.933833698), align=None)
        Polygon((29.75, -11.933833698), (29.75, -13.933833698), (38.92281403, -13.933833698), (58.9, -2.4), (54.9, -2.4), (38.386915645, -11.933833698), align=None)
        Polygon((4.6, -2.4), (0.6, -2.4), (20.57718597, -13.933833698), (29.75, -13.933833698), (29.75, -11.933833698), (21.113084355, -11.933833698), align=None)
    extrude(amount=-EXTRUDE_11_DEPTH)

    # Эскиз19 → Вырез-Вытянуть6 (cut, through all)
    with BuildSketch(Plane(origin=(0, 27, 0), x_dir=(1, 0, 0), z_dir=(0, 1, 0))):
        Polygon((26.75, -10.933833698), (26.75, -13.933833698), (29.75, -13.933833698), (29.75, -7.933833698), (24.25, -7.933833698), (24.25, -10.933833698), align=None)
        Polygon((29.75, -7.933833698), (29.75, -13.933833698), (32.75, -13.933833698), (32.75, -10.933833698), (35.25, -10.933833698), (35.25, -7.933833698), align=None)
    extrude(amount=-CUT_EXTRUDE_6_DEPTH, mode=Mode.SUBTRACT)

    # Скругление17
    fillet_17_edges = [part.edges().sort_by_distance(p)[0] for p in [
        (26.75, 13.5, 10.933833698),
        (32.75, 13.5, 10.933833698),
    ]]
    fillet(fillet_17_edges, radius=FILLET_17_R)


solid = part.part
